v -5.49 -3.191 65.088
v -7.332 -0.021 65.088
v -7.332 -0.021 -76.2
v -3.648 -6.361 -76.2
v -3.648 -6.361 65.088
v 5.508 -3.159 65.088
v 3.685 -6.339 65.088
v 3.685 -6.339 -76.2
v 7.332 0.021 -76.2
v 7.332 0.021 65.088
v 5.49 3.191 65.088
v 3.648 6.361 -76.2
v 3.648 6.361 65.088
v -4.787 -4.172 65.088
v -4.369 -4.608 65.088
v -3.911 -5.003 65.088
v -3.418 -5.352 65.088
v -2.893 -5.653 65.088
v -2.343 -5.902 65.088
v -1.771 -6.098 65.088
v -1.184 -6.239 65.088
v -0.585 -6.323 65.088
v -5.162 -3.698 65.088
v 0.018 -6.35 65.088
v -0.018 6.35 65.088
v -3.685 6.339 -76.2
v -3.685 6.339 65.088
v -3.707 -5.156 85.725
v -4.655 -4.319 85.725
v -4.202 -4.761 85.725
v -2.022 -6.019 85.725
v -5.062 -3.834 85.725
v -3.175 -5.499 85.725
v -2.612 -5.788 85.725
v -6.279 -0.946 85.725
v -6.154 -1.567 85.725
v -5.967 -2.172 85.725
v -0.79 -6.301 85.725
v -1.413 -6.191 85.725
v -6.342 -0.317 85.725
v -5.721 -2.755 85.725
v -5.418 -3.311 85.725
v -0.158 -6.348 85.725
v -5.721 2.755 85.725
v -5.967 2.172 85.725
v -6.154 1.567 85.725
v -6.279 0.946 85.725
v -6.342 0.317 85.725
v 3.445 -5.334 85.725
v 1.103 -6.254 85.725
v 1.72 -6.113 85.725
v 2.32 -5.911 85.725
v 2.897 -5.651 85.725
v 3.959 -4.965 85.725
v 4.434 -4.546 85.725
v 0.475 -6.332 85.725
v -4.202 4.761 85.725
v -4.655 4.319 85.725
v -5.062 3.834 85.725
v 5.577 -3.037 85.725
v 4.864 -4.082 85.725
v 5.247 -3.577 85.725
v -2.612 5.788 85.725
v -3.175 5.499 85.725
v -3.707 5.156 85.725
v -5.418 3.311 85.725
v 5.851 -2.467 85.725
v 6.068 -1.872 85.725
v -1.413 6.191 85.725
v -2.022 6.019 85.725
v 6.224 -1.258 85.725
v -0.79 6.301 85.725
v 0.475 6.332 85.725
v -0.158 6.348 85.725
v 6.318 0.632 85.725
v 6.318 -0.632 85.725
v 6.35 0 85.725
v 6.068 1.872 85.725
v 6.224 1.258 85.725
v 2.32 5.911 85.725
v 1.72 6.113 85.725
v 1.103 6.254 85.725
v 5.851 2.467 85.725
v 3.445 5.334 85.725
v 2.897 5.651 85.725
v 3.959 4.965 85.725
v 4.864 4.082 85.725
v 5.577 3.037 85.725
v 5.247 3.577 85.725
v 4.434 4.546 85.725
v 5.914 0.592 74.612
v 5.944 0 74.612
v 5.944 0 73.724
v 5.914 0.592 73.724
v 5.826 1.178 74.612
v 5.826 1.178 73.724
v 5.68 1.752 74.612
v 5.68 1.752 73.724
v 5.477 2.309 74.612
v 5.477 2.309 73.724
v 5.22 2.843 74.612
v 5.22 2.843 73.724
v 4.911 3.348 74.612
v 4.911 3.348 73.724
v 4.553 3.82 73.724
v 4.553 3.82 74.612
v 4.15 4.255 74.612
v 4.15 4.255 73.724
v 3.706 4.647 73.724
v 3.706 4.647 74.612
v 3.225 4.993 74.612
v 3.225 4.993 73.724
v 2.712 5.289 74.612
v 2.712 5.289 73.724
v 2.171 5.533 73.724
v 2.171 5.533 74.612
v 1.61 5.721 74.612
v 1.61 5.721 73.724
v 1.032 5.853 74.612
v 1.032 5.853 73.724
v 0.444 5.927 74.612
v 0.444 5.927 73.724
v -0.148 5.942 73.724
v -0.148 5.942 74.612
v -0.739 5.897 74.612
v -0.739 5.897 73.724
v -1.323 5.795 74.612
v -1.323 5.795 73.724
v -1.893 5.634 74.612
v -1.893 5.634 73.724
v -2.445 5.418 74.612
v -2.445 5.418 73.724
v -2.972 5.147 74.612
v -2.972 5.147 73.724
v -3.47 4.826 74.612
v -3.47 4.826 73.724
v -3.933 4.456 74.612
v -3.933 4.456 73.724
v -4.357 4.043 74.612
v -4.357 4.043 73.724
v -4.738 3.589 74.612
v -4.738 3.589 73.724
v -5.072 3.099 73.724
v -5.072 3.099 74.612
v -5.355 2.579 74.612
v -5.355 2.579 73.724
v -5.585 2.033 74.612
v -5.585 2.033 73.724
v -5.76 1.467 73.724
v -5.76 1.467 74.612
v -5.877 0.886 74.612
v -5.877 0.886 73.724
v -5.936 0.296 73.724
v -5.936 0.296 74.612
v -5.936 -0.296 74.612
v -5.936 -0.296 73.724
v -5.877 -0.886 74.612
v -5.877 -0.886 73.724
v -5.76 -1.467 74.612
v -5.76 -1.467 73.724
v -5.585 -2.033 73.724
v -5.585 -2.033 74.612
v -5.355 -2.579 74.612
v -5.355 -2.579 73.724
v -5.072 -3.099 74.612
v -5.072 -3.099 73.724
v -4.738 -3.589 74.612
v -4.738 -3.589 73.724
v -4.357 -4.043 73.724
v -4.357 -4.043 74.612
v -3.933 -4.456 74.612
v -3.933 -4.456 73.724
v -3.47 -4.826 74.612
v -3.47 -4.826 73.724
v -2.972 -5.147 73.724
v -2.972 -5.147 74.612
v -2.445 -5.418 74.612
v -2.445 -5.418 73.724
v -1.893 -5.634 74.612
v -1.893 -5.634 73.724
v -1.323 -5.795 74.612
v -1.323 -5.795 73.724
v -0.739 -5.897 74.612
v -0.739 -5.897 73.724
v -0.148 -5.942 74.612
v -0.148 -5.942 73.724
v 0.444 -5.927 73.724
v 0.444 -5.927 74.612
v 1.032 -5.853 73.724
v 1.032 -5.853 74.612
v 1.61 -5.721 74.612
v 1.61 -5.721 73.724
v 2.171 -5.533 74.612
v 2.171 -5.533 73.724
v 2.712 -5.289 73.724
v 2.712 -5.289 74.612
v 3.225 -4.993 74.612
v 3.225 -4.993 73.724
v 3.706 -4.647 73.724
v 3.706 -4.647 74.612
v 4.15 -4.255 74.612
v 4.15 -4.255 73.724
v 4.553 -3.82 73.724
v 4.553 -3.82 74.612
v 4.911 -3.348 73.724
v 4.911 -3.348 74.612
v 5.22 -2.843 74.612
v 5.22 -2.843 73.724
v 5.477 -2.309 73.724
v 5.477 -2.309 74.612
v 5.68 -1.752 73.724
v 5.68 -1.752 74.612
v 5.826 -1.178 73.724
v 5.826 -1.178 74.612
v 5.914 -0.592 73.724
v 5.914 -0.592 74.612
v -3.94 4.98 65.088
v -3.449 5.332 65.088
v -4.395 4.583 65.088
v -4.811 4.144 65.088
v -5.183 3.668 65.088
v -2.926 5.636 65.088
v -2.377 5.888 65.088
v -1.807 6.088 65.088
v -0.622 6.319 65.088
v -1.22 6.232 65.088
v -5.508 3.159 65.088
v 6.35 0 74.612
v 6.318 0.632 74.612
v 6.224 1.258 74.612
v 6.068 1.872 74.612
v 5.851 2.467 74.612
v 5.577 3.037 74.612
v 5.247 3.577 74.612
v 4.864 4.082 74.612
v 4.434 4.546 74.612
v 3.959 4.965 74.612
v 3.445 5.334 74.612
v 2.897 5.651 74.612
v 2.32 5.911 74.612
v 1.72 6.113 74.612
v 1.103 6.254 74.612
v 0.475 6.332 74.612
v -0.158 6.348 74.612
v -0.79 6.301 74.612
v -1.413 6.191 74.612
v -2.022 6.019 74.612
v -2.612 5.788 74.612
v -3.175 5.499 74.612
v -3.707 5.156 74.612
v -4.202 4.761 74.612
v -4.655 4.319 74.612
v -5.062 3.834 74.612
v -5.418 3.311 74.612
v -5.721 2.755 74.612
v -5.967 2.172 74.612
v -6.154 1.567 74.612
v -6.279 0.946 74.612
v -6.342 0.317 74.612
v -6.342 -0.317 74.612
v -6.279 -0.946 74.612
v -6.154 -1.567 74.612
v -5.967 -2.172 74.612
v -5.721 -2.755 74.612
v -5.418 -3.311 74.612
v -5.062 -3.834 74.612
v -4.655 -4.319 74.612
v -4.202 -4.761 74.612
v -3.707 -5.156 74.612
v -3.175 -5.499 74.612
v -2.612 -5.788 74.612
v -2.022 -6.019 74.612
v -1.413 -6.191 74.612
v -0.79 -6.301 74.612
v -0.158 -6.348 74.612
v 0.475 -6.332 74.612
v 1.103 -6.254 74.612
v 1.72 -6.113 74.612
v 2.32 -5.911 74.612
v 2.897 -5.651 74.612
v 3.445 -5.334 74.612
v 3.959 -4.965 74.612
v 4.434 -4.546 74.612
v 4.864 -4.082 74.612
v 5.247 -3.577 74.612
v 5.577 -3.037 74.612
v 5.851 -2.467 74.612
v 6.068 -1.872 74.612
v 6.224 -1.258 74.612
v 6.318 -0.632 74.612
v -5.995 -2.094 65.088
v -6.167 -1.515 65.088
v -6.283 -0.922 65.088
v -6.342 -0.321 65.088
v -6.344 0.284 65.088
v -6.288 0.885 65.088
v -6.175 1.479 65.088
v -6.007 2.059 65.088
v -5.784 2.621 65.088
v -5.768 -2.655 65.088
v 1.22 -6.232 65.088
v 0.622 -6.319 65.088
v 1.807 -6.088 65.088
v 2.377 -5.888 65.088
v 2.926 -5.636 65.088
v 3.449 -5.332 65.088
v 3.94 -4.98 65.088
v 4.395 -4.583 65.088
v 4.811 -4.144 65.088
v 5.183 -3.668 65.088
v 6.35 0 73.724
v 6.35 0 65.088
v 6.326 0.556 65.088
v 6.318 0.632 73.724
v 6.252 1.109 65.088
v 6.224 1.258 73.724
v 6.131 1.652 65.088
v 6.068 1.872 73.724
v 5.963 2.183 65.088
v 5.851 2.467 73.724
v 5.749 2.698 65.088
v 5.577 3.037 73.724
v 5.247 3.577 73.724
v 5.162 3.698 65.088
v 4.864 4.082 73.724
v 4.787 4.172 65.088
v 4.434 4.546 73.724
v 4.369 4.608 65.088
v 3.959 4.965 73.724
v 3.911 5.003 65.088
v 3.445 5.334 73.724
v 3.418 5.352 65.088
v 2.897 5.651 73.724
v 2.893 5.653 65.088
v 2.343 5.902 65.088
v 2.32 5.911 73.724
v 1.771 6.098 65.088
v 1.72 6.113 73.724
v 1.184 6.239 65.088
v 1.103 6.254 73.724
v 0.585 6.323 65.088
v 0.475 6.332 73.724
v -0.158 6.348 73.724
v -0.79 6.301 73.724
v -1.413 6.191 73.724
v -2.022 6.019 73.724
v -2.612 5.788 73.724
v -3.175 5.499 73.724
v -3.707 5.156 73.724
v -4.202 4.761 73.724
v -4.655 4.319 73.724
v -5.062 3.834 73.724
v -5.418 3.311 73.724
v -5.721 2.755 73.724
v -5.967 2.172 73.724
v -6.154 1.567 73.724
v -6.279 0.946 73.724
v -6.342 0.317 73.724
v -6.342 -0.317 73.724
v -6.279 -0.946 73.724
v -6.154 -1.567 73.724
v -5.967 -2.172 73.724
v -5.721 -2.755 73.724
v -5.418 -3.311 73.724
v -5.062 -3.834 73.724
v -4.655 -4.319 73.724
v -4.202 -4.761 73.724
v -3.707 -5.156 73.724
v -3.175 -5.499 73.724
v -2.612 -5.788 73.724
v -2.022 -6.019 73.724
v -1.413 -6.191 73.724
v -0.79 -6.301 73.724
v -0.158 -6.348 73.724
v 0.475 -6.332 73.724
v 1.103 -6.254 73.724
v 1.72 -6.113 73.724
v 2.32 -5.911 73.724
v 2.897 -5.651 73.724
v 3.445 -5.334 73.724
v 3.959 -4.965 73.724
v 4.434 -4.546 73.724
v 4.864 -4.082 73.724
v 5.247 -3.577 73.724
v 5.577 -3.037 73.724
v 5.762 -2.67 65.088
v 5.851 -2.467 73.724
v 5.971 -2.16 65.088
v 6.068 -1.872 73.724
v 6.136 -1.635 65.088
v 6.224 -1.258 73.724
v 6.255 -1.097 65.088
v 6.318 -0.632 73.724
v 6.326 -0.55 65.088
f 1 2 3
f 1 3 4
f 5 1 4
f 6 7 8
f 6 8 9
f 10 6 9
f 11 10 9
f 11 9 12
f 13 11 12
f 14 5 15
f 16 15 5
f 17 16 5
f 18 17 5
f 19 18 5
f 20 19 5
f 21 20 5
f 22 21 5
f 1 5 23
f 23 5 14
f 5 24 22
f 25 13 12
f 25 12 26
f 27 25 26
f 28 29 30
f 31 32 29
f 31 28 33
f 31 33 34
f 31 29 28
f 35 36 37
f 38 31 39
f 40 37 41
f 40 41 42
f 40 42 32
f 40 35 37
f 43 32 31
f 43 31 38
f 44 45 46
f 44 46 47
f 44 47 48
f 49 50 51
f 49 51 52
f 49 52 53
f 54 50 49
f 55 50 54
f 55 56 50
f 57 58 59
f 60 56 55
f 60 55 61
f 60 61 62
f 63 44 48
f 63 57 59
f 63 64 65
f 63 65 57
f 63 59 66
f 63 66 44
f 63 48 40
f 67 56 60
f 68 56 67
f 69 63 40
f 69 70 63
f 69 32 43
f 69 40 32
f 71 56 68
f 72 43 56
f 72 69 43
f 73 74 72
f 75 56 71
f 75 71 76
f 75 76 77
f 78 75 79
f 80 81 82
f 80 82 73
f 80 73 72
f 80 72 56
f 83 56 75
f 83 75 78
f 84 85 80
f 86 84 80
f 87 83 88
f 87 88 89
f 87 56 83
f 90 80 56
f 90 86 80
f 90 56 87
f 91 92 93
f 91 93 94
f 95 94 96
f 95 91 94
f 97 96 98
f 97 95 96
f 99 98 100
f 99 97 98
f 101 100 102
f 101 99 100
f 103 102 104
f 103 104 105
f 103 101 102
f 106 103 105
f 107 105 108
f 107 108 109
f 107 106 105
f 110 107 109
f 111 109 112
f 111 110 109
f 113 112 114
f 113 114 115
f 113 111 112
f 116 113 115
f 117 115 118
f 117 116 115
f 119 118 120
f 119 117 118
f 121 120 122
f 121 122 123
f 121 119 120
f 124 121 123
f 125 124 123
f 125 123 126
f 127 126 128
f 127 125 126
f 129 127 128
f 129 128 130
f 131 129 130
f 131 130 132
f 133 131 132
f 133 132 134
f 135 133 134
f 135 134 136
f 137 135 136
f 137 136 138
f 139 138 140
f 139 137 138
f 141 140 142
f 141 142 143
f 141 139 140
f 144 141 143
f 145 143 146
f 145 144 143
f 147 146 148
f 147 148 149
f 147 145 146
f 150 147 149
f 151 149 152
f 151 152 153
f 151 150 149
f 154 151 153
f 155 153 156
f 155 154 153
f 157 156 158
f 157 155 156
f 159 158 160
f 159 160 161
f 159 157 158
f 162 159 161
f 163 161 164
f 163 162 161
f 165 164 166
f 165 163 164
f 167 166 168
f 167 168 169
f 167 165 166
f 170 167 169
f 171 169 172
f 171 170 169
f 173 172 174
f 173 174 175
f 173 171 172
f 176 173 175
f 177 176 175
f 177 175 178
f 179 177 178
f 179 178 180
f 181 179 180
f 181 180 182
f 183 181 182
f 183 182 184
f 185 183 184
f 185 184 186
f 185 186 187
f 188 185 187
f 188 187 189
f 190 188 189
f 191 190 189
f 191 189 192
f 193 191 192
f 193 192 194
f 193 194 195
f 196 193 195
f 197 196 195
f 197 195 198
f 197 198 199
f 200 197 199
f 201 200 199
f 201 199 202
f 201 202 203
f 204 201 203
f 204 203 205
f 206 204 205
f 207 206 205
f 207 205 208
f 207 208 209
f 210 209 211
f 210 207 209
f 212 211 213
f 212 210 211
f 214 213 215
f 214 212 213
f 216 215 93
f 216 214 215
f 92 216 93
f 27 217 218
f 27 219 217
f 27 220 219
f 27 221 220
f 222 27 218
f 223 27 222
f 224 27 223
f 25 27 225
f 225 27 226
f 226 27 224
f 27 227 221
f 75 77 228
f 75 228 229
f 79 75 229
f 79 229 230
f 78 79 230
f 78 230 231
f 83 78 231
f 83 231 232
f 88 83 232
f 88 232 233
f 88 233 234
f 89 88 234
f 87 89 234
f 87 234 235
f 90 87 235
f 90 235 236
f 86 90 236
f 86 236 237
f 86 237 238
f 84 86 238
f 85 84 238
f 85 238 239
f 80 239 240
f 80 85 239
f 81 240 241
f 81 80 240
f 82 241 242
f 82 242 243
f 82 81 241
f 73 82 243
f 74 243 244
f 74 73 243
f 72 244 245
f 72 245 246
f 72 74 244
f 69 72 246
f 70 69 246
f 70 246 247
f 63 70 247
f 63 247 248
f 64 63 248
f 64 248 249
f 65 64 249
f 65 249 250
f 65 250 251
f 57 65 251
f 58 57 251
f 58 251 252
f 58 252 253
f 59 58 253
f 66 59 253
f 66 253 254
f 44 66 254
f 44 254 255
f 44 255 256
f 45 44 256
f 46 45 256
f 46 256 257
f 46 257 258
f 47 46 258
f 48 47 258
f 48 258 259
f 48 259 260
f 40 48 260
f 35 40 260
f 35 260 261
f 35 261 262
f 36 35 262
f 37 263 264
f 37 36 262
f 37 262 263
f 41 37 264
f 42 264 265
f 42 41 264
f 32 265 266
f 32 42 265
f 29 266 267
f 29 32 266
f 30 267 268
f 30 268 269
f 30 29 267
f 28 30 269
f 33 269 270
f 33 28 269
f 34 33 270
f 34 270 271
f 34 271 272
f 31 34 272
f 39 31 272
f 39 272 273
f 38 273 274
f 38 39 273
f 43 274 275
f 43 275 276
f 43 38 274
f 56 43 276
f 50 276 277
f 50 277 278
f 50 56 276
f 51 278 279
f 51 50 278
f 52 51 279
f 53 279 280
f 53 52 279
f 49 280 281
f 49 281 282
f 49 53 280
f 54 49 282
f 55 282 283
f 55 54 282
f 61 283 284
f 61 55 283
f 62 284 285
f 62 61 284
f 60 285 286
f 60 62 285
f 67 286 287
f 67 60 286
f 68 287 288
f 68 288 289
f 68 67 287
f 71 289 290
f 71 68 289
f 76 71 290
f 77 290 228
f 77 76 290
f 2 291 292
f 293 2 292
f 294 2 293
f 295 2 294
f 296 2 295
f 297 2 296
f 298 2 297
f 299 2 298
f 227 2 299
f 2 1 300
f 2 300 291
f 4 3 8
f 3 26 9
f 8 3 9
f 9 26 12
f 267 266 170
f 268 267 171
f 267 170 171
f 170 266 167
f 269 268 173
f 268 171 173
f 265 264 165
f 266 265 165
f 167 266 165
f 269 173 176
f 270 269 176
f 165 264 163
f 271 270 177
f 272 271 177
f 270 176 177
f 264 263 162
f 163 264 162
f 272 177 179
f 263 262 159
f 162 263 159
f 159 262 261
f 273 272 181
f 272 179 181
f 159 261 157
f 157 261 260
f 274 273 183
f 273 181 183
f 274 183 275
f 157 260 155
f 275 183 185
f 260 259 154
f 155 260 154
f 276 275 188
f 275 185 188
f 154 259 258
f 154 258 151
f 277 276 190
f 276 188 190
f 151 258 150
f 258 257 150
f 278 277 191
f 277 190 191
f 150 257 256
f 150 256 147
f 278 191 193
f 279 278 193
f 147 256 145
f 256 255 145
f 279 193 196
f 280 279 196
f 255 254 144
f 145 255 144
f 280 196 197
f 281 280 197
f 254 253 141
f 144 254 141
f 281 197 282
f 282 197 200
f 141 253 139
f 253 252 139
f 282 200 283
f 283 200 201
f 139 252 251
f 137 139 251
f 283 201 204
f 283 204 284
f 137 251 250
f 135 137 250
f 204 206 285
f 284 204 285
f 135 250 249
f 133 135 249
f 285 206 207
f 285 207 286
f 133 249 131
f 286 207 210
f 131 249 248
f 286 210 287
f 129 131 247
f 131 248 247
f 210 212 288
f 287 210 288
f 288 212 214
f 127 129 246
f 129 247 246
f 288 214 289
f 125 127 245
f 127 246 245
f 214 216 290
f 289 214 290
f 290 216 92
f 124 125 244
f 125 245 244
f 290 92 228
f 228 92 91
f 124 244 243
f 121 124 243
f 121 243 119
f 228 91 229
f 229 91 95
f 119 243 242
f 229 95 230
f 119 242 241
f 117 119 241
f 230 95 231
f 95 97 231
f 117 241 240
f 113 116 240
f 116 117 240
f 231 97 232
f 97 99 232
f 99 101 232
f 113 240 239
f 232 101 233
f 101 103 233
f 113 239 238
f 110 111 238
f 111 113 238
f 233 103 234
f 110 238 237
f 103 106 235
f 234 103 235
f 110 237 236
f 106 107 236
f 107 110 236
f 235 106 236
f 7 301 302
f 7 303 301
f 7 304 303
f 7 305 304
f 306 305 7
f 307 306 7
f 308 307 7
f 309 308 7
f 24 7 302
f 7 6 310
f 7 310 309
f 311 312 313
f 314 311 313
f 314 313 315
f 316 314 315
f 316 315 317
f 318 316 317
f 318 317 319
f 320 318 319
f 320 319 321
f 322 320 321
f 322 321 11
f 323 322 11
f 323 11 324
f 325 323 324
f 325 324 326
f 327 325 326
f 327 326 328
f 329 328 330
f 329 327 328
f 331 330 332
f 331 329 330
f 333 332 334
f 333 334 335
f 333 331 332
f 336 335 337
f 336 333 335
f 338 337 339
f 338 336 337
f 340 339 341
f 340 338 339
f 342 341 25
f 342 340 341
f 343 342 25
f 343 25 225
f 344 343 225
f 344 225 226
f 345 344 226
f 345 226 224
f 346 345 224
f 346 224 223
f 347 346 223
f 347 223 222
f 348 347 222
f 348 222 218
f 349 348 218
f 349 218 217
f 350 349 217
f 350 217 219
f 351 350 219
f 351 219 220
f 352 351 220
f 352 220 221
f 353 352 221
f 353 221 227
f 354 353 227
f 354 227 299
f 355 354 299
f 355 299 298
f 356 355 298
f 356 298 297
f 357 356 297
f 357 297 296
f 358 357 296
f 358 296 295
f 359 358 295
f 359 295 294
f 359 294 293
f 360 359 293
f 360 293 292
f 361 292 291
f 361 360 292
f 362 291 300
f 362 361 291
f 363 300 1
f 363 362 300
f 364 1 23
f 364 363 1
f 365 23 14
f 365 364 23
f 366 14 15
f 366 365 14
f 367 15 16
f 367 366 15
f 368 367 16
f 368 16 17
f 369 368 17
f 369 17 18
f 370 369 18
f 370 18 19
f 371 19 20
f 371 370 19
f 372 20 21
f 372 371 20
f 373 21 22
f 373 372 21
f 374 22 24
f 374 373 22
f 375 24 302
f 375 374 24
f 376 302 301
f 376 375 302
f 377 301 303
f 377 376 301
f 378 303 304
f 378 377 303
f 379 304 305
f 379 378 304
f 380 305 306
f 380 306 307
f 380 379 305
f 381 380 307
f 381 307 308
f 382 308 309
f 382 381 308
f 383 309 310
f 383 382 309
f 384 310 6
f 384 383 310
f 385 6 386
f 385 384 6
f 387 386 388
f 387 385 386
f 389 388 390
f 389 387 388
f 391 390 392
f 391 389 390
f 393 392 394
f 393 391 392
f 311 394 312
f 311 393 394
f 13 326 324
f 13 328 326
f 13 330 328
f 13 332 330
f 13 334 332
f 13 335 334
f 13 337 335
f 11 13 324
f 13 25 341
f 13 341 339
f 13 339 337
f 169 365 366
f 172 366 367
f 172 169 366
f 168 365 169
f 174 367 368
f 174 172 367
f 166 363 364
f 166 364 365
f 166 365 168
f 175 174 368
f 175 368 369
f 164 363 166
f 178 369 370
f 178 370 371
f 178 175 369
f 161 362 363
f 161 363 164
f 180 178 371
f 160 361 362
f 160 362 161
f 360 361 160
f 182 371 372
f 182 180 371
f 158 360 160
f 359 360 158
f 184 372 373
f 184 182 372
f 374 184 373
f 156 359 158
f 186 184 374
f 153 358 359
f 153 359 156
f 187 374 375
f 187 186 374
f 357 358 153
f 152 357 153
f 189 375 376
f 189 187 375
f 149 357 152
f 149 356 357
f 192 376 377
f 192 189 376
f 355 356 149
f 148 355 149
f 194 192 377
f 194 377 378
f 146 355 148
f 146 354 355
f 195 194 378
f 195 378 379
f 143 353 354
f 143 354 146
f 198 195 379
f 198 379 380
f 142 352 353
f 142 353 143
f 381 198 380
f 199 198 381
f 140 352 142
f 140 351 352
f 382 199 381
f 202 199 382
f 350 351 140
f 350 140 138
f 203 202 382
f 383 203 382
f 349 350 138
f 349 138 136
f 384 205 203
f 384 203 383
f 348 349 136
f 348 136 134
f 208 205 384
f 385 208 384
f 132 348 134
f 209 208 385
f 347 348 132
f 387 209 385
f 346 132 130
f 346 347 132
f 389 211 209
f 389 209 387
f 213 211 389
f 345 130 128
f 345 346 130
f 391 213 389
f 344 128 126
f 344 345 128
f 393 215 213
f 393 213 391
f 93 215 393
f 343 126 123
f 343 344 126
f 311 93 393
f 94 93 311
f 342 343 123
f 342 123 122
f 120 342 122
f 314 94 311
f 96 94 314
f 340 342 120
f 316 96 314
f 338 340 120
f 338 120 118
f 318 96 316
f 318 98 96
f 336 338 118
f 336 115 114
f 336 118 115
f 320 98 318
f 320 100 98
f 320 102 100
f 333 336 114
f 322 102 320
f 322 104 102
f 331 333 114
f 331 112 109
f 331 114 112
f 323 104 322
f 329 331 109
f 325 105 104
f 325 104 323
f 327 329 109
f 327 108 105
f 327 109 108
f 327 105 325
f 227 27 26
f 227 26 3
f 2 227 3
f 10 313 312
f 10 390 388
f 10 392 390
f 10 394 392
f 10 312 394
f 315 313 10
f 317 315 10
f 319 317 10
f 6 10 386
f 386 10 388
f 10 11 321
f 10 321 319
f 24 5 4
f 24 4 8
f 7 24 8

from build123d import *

# Parameters (mm, degrees)
BOSS_EXTRUDE1_DEPTH = 76.2
SKETCH2_R           = 7.332348419
SKETCH2_R_2         = 6.35
CUT_EXTRUDE1_DEPTH  = 11.1125
BOSS_EXTRUDE2_START = 9.525
SKETCH3_R           = 6.35
BOSS_EXTRUDE2_DEPTH = 9.525
SKETCH4_R           = 7.332348419
SKETCH4_R_2         = 5.9436
CUT_EXTRUDE2_DEPTH  = 0.889


with BuildPart() as part:
    # Sketch1 → Boss-Extrude1 (new, symmetric)
    with BuildSketch(Plane.XY):
        Polygon((3.684589596, -6.339332208), (7.332317533, 0.021282089), (3.647727937, 6.360614297), (-3.684589596, 6.339332208), (-7.332317533, -0.021282089), (-3.647727937, -6.360614297), align=None)
    extrude(amount=BOSS_EXTRUDE1_DEPTH, both=True)

    # Sketch2 → Cut-Extrude1 (cut)
    with BuildSketch(Plane.XY.offset(76.2)):
        Circle(SKETCH2_R)
        Circle(SKETCH2_R_2, mode=Mode.SUBTRACT)
    extrude(amount=-CUT_EXTRUDE1_DEPTH, mode=Mode.SUBTRACT)

    # Sketch3 → Boss-Extrude2 (add)
    with BuildSketch(Plane.XY.offset(76.2).offset(BOSS_EXTRUDE2_START)):
        Circle(SKETCH3_R)
    extrude(amount=-BOSS_EXTRUDE2_DEPTH)

    # Sketch4 → Cut-Extrude2 (cut)
    with BuildSketch(Plane.XY.offset(74.6125)):
        Circle(SKETCH4_R)
        Circle(SKETCH4_R_2, mode=Mode.SUBTRACT)
    extrude(amount=-CUT_EXTRUDE2_DEPTH, mode=Mode.SUBTRACT)


solid = part.part
